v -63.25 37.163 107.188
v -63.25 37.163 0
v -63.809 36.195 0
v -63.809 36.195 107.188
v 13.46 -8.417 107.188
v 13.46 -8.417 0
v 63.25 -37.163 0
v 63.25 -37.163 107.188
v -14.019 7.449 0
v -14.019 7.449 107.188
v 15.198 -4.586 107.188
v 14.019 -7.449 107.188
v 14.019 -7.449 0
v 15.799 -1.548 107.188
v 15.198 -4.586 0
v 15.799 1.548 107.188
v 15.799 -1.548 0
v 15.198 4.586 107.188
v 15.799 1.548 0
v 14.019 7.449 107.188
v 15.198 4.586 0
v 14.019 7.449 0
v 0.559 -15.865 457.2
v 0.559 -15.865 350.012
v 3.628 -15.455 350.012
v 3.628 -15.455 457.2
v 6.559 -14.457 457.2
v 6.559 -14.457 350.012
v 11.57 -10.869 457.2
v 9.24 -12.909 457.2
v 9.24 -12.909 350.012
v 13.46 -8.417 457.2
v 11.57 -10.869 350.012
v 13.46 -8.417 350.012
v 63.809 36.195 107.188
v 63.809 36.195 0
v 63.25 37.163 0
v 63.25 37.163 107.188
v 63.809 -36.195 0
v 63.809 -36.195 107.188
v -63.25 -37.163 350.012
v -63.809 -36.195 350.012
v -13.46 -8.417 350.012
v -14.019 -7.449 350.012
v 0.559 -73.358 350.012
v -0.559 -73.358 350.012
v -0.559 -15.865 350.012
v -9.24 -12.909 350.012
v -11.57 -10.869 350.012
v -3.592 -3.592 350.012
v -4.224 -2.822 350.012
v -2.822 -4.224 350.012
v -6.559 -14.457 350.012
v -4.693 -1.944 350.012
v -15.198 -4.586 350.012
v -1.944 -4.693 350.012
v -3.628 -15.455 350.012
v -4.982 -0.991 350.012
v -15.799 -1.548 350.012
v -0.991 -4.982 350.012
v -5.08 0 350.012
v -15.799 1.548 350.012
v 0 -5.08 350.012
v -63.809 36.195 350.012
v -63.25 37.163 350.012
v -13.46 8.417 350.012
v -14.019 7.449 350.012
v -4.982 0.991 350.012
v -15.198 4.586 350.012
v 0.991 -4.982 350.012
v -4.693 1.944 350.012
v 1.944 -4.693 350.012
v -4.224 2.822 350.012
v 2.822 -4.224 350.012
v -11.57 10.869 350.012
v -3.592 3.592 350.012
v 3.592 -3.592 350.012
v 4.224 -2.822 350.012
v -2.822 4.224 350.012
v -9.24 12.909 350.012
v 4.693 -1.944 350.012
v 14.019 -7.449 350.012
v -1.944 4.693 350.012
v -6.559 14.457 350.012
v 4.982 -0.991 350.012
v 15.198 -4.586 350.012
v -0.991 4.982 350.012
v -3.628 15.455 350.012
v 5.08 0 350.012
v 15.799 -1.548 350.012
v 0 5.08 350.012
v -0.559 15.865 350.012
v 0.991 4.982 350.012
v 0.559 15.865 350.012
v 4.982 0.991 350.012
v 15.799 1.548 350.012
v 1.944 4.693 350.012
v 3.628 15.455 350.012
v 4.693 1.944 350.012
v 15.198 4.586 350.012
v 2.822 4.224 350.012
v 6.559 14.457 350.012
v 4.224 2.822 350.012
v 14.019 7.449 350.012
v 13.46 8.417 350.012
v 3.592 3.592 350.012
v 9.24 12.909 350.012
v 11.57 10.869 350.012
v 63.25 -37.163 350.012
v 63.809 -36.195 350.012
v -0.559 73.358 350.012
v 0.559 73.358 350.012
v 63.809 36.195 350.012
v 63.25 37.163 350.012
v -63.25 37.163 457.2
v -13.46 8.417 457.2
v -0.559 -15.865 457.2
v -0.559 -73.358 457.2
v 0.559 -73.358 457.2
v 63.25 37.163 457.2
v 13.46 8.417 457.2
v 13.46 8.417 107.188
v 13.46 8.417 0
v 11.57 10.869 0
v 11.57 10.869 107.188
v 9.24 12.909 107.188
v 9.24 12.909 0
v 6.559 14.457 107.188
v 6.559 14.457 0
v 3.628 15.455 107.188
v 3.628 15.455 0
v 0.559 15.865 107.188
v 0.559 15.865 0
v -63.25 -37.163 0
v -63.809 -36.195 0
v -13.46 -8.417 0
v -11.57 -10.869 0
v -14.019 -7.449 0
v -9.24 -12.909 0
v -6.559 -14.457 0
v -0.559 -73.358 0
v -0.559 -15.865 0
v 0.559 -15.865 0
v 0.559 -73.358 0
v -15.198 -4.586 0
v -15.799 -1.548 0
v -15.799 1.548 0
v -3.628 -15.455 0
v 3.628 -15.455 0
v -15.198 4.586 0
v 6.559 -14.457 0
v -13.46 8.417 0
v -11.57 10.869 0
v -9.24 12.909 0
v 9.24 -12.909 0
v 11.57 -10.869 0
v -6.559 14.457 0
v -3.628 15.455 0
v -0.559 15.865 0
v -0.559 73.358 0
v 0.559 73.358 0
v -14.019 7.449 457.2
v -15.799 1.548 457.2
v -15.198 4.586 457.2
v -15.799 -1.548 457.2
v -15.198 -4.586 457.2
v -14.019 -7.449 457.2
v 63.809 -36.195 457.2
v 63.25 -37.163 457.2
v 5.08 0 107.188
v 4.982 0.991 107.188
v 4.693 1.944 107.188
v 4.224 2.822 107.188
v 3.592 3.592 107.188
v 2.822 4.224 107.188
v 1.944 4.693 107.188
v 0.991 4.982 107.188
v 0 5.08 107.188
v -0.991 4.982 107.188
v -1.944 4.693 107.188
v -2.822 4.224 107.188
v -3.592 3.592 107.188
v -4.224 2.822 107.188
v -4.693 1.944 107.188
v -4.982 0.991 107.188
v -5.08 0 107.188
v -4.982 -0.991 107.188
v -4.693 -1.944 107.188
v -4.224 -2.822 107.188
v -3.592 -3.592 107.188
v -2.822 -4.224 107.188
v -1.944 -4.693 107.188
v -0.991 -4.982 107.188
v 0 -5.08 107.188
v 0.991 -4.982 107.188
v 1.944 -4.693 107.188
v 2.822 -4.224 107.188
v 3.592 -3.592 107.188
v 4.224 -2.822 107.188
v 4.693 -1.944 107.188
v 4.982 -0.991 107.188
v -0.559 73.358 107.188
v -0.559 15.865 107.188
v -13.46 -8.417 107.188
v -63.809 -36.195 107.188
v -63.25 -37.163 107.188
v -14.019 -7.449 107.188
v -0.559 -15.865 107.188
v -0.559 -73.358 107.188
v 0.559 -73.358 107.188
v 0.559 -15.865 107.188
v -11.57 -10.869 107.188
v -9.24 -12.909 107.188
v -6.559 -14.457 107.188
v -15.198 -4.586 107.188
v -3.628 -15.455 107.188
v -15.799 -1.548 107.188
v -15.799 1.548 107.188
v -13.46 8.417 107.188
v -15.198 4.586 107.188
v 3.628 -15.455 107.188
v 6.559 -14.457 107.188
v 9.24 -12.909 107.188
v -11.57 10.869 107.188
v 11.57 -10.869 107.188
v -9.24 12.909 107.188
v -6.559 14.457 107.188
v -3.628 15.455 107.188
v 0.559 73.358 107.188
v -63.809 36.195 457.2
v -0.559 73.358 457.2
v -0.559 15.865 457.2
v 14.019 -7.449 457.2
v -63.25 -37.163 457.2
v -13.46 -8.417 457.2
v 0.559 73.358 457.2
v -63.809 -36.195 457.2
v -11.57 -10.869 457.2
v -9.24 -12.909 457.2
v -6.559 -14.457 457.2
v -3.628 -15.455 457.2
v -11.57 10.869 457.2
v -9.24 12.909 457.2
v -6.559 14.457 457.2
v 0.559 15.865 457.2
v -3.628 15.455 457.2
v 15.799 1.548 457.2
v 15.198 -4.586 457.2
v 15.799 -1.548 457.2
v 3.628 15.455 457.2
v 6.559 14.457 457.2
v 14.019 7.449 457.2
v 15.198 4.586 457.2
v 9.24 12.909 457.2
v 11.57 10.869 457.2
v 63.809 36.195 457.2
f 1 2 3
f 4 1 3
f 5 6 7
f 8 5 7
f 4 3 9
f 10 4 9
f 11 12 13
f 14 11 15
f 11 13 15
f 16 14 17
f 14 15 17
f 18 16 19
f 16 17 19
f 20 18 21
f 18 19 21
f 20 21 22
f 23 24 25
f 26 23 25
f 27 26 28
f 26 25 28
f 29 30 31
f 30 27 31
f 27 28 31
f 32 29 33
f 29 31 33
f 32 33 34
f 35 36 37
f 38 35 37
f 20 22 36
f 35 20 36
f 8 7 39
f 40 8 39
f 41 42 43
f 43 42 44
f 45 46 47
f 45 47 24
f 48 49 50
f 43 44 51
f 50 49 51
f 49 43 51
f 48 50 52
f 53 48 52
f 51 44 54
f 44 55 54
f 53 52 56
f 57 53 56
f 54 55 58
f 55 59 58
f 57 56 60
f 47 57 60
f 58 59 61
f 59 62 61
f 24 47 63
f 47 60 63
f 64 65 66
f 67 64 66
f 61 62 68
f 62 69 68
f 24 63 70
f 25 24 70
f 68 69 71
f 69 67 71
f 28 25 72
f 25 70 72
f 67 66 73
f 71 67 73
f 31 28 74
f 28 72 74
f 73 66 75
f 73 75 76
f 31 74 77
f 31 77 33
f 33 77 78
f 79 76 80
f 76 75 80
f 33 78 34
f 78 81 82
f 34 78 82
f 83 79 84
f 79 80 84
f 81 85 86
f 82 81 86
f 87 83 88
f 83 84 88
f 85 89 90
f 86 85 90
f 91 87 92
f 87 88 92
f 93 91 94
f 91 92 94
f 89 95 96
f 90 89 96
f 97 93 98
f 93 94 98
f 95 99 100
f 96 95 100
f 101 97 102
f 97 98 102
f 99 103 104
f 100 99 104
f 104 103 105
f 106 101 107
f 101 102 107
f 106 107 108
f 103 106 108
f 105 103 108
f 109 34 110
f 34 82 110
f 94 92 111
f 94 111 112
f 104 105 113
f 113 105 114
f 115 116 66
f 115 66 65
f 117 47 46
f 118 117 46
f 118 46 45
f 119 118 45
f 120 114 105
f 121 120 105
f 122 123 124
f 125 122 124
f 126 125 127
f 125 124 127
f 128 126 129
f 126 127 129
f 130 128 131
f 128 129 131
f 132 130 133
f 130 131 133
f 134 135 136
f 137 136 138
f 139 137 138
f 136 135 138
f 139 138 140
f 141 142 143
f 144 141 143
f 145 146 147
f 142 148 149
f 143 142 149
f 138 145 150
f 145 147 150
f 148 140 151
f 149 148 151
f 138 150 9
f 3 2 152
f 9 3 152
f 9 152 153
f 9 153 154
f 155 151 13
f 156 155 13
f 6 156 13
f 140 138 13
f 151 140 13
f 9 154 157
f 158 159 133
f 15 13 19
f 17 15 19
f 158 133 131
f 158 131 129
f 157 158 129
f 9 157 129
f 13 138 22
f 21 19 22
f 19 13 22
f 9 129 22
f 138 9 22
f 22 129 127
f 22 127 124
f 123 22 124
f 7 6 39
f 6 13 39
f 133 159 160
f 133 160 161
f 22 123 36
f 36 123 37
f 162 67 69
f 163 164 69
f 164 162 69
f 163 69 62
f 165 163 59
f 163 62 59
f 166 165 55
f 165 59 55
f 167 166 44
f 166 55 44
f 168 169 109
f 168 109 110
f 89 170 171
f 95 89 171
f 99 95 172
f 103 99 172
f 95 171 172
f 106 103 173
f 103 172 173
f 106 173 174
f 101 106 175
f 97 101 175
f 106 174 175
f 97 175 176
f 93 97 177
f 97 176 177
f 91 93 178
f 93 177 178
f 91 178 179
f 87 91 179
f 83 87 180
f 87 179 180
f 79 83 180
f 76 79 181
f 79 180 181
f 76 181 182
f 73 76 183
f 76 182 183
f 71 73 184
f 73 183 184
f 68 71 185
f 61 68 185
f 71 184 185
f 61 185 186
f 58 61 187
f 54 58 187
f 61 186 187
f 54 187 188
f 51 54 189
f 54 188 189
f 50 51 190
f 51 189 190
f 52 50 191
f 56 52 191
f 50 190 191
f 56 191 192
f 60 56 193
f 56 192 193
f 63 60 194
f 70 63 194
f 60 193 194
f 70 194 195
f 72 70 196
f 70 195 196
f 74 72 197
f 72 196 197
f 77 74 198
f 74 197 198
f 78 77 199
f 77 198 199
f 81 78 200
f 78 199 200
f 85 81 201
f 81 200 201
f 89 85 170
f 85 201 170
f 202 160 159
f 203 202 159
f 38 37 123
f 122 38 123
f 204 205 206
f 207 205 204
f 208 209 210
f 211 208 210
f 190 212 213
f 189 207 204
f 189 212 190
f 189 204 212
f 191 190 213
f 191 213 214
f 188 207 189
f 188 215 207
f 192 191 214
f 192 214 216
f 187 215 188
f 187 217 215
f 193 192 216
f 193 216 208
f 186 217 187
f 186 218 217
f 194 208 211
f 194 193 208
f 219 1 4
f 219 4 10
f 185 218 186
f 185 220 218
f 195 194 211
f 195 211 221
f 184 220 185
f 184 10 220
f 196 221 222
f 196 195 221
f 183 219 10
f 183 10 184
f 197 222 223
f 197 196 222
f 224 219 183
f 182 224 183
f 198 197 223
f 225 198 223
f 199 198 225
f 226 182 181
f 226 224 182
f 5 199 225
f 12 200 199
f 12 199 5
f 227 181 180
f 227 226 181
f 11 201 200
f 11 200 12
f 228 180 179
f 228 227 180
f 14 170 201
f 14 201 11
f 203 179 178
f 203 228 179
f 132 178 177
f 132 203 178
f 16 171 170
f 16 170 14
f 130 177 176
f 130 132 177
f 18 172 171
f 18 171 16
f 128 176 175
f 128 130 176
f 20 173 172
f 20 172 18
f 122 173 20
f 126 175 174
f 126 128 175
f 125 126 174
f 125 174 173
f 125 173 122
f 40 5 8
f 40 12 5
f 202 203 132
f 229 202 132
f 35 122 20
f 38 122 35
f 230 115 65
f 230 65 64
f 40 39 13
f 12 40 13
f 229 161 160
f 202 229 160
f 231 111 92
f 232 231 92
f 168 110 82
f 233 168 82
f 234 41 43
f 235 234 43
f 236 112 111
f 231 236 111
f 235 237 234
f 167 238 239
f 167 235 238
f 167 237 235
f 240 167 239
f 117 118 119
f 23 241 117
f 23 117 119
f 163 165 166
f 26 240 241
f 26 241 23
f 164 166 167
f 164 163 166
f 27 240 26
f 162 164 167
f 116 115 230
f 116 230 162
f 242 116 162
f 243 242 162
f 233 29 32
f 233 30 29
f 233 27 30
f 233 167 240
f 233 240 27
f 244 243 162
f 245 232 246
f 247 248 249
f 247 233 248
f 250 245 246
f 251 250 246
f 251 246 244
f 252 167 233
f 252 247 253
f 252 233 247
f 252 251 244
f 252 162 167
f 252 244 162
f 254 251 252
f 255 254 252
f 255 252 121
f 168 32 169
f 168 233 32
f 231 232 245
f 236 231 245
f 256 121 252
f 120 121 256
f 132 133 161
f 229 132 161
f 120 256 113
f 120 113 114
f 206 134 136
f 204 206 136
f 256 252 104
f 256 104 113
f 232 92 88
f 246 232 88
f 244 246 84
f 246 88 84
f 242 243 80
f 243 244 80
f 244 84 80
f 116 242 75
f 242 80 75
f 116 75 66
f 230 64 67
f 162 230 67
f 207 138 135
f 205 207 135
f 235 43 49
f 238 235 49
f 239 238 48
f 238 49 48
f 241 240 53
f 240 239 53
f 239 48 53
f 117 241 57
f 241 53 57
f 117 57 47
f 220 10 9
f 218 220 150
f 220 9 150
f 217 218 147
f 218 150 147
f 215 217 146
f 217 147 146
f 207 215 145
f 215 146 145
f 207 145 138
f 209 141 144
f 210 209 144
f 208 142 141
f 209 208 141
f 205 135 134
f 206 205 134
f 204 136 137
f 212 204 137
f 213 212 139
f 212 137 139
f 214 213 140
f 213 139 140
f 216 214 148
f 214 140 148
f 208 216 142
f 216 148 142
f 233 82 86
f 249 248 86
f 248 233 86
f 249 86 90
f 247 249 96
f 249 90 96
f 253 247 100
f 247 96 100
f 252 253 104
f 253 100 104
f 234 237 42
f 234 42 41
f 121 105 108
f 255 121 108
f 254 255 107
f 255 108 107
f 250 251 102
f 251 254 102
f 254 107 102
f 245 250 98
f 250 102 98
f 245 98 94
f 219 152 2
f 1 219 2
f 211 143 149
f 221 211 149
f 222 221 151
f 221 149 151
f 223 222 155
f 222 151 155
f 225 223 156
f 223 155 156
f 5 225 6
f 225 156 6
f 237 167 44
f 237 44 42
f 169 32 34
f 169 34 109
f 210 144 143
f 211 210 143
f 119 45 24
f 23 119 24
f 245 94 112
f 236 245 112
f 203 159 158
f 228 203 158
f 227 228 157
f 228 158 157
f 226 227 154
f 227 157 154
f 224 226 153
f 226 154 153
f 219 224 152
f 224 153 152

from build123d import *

# Parameters (mm, degrees)
F1_W     = 254
F1_H     = 254
F2_DEPTH = 107.188
F3_R     = 5.08
F4_DEPTH = 242.824
F5_W     = 254
F5_H     = 254
F5_R     = 5.08
F6_DEPTH = 107.188
F7_R     = 5.08
F8_DEPTH = 107.188
F9_DEPTH = 543.306


with BuildPart() as f2:
    # F1 (on Top) → F2 (new body)
    with BuildSketch(Plane.XY):
        Rectangle(F1_W, F1_H)
    extrude(amount=F2_DEPTH)

    # F3 (on face) → F4 (join)
    with BuildSketch(Plane.XY.offset(107.188)):
        Circle(F3_R)
    extrude(amount=F4_DEPTH)

    # F5 (on face) → F6 (join)
    with BuildSketch(Plane.XY.offset(350.012)):
        Rectangle(F5_W, F5_H)
        Circle(F5_R, mode=Mode.SUBTRACT)
    extrude(amount=F6_DEPTH)

    # F7 (on face) → F8 (join)
    with BuildSketch(Plane.XY.offset(350.012)):
        Circle(F7_R)
    extrude(amount=F8_DEPTH)

    # F0 (on Top) → F9 (intersect)
    with BuildSketch(Plane.XY):
        with BuildLine():
            Line((0.5588, -73.3578699913), (0.5588, -15.8651620717))
            ThreePointArc((0.5588, -15.8651620717), (7.9375, -13.7481532851), (13.4602333892, -8.4165160315))
            Line((13.4602333892, -8.4165160315), (63.25037898, -37.1628699913))
            Line((63.25037898, -37.1628699913), (63.80917898, -36.195))
            Line((63.80917898, -36.195), (14.0190333892, -7.4486460402))
            ThreePointArc((14.0190333892, -7.4486460402), (15.875, 0), (14.0190333892, 7.4486460402))
            Line((14.0190333892, 7.4486460402), (63.80917898, 36.195))
            Line((63.80917898, 36.195), (63.25037898, 37.1628699913))
            Line((63.25037898, 37.1628699913), (13.4602333892, 8.4165160315))
            ThreePointArc((13.4602333892, 8.4165160315), (7.9375, 13.7481532851), (0.5588, 15.8651620717))
            Line((0.5588, 15.8651620717), (0.5588, 73.3578699913))
            Line((0.5588, 73.3578699913), (-0.5588, 73.3578699913))
            Line((-0.5588, 73.3578699913), (-0.5588, 15.8651620717))
            ThreePointArc((-0.5588, 15.8651620717), (-7.9375, 13.7481532851), (-13.4602333892, 8.4165160315))
            Line((-13.4602333892, 8.4165160315), (-63.25037898, 37.1628699913))
            Line((-63.25037898, 37.1628699913), (-63.80917898, 36.195))
            Line((-63.80917898, 36.195), (-14.0190333892, 7.4486460402))
            ThreePointArc((-14.0190333892, 7.4486460402), (-15.875, 0), (-14.0190333892, -7.4486460402))
            Line((-14.0190333892, -7.4486460402), (-63.80917898, -36.195))
            Line((-63.80917898, -36.195), (-63.25037898, -37.1628699913))
            Line((-63.25037898, -37.1628699913), (-13.4602333892, -8.4165160315))
            ThreePointArc((-13.4602333892, -8.4165160315), (-7.9375, -13.7481532851), (-0.5588, -15.8651620717))
            Line((-0.5588, -15.8651620717), (-0.5588, -73.3578699913))
            Line((-0.5588, -73.3578699913), (0.5588, -73.3578699913))
        make_face()
        with BuildLine():
            ThreePointArc((-0.5588, -5.0491724629), (-3.3887826723, 3.7845147641), (5.08, 0))
            ThreePointArc((5.08, 0), (3.7845147641, -3.3887826723), (0.5588, -5.0491724629))
            ThreePointArc((0.5588, -5.0491724629), (0, -5.08), (-0.5588, -5.0491724629))
        make_face(mode=Mode.SUBTRACT)
        with BuildLine():
            ThreePointArc((0.5588, -5.0491724629), (3.7845147641, -3.3887826723), (5.08, 0))
            ThreePointArc((5.08, 0), (-3.3887826723, 3.7845147641), (-0.5588, -5.0491724629))
            Line((-0.5588, -5.0491724629), (-0.5588, -0.9678699913))
            Line((-0.5588, -0.9678699913), (0.5588, -0.9678699913))
            Line((0.5588, -0.9678699913), (0.5588, -5.0491724629))
        make_face()
        with BuildLine():
            Line((-0.5588, -0.9678699913), (-0.5588, -5.0491724629))
            ThreePointArc((-0.5588, -5.0491724629), (0, -5.08), (0.5588, -5.0491724629))
            Line((0.5588, -5.0491724629), (0.5588, -0.9678699913))
            Line((0.5588, -0.9678699913), (-0.5588, -0.9678699913))
        make_face()
    extrude(amount=F9_DEPTH, mode=Mode.INTERSECT)


solid = f2.part
